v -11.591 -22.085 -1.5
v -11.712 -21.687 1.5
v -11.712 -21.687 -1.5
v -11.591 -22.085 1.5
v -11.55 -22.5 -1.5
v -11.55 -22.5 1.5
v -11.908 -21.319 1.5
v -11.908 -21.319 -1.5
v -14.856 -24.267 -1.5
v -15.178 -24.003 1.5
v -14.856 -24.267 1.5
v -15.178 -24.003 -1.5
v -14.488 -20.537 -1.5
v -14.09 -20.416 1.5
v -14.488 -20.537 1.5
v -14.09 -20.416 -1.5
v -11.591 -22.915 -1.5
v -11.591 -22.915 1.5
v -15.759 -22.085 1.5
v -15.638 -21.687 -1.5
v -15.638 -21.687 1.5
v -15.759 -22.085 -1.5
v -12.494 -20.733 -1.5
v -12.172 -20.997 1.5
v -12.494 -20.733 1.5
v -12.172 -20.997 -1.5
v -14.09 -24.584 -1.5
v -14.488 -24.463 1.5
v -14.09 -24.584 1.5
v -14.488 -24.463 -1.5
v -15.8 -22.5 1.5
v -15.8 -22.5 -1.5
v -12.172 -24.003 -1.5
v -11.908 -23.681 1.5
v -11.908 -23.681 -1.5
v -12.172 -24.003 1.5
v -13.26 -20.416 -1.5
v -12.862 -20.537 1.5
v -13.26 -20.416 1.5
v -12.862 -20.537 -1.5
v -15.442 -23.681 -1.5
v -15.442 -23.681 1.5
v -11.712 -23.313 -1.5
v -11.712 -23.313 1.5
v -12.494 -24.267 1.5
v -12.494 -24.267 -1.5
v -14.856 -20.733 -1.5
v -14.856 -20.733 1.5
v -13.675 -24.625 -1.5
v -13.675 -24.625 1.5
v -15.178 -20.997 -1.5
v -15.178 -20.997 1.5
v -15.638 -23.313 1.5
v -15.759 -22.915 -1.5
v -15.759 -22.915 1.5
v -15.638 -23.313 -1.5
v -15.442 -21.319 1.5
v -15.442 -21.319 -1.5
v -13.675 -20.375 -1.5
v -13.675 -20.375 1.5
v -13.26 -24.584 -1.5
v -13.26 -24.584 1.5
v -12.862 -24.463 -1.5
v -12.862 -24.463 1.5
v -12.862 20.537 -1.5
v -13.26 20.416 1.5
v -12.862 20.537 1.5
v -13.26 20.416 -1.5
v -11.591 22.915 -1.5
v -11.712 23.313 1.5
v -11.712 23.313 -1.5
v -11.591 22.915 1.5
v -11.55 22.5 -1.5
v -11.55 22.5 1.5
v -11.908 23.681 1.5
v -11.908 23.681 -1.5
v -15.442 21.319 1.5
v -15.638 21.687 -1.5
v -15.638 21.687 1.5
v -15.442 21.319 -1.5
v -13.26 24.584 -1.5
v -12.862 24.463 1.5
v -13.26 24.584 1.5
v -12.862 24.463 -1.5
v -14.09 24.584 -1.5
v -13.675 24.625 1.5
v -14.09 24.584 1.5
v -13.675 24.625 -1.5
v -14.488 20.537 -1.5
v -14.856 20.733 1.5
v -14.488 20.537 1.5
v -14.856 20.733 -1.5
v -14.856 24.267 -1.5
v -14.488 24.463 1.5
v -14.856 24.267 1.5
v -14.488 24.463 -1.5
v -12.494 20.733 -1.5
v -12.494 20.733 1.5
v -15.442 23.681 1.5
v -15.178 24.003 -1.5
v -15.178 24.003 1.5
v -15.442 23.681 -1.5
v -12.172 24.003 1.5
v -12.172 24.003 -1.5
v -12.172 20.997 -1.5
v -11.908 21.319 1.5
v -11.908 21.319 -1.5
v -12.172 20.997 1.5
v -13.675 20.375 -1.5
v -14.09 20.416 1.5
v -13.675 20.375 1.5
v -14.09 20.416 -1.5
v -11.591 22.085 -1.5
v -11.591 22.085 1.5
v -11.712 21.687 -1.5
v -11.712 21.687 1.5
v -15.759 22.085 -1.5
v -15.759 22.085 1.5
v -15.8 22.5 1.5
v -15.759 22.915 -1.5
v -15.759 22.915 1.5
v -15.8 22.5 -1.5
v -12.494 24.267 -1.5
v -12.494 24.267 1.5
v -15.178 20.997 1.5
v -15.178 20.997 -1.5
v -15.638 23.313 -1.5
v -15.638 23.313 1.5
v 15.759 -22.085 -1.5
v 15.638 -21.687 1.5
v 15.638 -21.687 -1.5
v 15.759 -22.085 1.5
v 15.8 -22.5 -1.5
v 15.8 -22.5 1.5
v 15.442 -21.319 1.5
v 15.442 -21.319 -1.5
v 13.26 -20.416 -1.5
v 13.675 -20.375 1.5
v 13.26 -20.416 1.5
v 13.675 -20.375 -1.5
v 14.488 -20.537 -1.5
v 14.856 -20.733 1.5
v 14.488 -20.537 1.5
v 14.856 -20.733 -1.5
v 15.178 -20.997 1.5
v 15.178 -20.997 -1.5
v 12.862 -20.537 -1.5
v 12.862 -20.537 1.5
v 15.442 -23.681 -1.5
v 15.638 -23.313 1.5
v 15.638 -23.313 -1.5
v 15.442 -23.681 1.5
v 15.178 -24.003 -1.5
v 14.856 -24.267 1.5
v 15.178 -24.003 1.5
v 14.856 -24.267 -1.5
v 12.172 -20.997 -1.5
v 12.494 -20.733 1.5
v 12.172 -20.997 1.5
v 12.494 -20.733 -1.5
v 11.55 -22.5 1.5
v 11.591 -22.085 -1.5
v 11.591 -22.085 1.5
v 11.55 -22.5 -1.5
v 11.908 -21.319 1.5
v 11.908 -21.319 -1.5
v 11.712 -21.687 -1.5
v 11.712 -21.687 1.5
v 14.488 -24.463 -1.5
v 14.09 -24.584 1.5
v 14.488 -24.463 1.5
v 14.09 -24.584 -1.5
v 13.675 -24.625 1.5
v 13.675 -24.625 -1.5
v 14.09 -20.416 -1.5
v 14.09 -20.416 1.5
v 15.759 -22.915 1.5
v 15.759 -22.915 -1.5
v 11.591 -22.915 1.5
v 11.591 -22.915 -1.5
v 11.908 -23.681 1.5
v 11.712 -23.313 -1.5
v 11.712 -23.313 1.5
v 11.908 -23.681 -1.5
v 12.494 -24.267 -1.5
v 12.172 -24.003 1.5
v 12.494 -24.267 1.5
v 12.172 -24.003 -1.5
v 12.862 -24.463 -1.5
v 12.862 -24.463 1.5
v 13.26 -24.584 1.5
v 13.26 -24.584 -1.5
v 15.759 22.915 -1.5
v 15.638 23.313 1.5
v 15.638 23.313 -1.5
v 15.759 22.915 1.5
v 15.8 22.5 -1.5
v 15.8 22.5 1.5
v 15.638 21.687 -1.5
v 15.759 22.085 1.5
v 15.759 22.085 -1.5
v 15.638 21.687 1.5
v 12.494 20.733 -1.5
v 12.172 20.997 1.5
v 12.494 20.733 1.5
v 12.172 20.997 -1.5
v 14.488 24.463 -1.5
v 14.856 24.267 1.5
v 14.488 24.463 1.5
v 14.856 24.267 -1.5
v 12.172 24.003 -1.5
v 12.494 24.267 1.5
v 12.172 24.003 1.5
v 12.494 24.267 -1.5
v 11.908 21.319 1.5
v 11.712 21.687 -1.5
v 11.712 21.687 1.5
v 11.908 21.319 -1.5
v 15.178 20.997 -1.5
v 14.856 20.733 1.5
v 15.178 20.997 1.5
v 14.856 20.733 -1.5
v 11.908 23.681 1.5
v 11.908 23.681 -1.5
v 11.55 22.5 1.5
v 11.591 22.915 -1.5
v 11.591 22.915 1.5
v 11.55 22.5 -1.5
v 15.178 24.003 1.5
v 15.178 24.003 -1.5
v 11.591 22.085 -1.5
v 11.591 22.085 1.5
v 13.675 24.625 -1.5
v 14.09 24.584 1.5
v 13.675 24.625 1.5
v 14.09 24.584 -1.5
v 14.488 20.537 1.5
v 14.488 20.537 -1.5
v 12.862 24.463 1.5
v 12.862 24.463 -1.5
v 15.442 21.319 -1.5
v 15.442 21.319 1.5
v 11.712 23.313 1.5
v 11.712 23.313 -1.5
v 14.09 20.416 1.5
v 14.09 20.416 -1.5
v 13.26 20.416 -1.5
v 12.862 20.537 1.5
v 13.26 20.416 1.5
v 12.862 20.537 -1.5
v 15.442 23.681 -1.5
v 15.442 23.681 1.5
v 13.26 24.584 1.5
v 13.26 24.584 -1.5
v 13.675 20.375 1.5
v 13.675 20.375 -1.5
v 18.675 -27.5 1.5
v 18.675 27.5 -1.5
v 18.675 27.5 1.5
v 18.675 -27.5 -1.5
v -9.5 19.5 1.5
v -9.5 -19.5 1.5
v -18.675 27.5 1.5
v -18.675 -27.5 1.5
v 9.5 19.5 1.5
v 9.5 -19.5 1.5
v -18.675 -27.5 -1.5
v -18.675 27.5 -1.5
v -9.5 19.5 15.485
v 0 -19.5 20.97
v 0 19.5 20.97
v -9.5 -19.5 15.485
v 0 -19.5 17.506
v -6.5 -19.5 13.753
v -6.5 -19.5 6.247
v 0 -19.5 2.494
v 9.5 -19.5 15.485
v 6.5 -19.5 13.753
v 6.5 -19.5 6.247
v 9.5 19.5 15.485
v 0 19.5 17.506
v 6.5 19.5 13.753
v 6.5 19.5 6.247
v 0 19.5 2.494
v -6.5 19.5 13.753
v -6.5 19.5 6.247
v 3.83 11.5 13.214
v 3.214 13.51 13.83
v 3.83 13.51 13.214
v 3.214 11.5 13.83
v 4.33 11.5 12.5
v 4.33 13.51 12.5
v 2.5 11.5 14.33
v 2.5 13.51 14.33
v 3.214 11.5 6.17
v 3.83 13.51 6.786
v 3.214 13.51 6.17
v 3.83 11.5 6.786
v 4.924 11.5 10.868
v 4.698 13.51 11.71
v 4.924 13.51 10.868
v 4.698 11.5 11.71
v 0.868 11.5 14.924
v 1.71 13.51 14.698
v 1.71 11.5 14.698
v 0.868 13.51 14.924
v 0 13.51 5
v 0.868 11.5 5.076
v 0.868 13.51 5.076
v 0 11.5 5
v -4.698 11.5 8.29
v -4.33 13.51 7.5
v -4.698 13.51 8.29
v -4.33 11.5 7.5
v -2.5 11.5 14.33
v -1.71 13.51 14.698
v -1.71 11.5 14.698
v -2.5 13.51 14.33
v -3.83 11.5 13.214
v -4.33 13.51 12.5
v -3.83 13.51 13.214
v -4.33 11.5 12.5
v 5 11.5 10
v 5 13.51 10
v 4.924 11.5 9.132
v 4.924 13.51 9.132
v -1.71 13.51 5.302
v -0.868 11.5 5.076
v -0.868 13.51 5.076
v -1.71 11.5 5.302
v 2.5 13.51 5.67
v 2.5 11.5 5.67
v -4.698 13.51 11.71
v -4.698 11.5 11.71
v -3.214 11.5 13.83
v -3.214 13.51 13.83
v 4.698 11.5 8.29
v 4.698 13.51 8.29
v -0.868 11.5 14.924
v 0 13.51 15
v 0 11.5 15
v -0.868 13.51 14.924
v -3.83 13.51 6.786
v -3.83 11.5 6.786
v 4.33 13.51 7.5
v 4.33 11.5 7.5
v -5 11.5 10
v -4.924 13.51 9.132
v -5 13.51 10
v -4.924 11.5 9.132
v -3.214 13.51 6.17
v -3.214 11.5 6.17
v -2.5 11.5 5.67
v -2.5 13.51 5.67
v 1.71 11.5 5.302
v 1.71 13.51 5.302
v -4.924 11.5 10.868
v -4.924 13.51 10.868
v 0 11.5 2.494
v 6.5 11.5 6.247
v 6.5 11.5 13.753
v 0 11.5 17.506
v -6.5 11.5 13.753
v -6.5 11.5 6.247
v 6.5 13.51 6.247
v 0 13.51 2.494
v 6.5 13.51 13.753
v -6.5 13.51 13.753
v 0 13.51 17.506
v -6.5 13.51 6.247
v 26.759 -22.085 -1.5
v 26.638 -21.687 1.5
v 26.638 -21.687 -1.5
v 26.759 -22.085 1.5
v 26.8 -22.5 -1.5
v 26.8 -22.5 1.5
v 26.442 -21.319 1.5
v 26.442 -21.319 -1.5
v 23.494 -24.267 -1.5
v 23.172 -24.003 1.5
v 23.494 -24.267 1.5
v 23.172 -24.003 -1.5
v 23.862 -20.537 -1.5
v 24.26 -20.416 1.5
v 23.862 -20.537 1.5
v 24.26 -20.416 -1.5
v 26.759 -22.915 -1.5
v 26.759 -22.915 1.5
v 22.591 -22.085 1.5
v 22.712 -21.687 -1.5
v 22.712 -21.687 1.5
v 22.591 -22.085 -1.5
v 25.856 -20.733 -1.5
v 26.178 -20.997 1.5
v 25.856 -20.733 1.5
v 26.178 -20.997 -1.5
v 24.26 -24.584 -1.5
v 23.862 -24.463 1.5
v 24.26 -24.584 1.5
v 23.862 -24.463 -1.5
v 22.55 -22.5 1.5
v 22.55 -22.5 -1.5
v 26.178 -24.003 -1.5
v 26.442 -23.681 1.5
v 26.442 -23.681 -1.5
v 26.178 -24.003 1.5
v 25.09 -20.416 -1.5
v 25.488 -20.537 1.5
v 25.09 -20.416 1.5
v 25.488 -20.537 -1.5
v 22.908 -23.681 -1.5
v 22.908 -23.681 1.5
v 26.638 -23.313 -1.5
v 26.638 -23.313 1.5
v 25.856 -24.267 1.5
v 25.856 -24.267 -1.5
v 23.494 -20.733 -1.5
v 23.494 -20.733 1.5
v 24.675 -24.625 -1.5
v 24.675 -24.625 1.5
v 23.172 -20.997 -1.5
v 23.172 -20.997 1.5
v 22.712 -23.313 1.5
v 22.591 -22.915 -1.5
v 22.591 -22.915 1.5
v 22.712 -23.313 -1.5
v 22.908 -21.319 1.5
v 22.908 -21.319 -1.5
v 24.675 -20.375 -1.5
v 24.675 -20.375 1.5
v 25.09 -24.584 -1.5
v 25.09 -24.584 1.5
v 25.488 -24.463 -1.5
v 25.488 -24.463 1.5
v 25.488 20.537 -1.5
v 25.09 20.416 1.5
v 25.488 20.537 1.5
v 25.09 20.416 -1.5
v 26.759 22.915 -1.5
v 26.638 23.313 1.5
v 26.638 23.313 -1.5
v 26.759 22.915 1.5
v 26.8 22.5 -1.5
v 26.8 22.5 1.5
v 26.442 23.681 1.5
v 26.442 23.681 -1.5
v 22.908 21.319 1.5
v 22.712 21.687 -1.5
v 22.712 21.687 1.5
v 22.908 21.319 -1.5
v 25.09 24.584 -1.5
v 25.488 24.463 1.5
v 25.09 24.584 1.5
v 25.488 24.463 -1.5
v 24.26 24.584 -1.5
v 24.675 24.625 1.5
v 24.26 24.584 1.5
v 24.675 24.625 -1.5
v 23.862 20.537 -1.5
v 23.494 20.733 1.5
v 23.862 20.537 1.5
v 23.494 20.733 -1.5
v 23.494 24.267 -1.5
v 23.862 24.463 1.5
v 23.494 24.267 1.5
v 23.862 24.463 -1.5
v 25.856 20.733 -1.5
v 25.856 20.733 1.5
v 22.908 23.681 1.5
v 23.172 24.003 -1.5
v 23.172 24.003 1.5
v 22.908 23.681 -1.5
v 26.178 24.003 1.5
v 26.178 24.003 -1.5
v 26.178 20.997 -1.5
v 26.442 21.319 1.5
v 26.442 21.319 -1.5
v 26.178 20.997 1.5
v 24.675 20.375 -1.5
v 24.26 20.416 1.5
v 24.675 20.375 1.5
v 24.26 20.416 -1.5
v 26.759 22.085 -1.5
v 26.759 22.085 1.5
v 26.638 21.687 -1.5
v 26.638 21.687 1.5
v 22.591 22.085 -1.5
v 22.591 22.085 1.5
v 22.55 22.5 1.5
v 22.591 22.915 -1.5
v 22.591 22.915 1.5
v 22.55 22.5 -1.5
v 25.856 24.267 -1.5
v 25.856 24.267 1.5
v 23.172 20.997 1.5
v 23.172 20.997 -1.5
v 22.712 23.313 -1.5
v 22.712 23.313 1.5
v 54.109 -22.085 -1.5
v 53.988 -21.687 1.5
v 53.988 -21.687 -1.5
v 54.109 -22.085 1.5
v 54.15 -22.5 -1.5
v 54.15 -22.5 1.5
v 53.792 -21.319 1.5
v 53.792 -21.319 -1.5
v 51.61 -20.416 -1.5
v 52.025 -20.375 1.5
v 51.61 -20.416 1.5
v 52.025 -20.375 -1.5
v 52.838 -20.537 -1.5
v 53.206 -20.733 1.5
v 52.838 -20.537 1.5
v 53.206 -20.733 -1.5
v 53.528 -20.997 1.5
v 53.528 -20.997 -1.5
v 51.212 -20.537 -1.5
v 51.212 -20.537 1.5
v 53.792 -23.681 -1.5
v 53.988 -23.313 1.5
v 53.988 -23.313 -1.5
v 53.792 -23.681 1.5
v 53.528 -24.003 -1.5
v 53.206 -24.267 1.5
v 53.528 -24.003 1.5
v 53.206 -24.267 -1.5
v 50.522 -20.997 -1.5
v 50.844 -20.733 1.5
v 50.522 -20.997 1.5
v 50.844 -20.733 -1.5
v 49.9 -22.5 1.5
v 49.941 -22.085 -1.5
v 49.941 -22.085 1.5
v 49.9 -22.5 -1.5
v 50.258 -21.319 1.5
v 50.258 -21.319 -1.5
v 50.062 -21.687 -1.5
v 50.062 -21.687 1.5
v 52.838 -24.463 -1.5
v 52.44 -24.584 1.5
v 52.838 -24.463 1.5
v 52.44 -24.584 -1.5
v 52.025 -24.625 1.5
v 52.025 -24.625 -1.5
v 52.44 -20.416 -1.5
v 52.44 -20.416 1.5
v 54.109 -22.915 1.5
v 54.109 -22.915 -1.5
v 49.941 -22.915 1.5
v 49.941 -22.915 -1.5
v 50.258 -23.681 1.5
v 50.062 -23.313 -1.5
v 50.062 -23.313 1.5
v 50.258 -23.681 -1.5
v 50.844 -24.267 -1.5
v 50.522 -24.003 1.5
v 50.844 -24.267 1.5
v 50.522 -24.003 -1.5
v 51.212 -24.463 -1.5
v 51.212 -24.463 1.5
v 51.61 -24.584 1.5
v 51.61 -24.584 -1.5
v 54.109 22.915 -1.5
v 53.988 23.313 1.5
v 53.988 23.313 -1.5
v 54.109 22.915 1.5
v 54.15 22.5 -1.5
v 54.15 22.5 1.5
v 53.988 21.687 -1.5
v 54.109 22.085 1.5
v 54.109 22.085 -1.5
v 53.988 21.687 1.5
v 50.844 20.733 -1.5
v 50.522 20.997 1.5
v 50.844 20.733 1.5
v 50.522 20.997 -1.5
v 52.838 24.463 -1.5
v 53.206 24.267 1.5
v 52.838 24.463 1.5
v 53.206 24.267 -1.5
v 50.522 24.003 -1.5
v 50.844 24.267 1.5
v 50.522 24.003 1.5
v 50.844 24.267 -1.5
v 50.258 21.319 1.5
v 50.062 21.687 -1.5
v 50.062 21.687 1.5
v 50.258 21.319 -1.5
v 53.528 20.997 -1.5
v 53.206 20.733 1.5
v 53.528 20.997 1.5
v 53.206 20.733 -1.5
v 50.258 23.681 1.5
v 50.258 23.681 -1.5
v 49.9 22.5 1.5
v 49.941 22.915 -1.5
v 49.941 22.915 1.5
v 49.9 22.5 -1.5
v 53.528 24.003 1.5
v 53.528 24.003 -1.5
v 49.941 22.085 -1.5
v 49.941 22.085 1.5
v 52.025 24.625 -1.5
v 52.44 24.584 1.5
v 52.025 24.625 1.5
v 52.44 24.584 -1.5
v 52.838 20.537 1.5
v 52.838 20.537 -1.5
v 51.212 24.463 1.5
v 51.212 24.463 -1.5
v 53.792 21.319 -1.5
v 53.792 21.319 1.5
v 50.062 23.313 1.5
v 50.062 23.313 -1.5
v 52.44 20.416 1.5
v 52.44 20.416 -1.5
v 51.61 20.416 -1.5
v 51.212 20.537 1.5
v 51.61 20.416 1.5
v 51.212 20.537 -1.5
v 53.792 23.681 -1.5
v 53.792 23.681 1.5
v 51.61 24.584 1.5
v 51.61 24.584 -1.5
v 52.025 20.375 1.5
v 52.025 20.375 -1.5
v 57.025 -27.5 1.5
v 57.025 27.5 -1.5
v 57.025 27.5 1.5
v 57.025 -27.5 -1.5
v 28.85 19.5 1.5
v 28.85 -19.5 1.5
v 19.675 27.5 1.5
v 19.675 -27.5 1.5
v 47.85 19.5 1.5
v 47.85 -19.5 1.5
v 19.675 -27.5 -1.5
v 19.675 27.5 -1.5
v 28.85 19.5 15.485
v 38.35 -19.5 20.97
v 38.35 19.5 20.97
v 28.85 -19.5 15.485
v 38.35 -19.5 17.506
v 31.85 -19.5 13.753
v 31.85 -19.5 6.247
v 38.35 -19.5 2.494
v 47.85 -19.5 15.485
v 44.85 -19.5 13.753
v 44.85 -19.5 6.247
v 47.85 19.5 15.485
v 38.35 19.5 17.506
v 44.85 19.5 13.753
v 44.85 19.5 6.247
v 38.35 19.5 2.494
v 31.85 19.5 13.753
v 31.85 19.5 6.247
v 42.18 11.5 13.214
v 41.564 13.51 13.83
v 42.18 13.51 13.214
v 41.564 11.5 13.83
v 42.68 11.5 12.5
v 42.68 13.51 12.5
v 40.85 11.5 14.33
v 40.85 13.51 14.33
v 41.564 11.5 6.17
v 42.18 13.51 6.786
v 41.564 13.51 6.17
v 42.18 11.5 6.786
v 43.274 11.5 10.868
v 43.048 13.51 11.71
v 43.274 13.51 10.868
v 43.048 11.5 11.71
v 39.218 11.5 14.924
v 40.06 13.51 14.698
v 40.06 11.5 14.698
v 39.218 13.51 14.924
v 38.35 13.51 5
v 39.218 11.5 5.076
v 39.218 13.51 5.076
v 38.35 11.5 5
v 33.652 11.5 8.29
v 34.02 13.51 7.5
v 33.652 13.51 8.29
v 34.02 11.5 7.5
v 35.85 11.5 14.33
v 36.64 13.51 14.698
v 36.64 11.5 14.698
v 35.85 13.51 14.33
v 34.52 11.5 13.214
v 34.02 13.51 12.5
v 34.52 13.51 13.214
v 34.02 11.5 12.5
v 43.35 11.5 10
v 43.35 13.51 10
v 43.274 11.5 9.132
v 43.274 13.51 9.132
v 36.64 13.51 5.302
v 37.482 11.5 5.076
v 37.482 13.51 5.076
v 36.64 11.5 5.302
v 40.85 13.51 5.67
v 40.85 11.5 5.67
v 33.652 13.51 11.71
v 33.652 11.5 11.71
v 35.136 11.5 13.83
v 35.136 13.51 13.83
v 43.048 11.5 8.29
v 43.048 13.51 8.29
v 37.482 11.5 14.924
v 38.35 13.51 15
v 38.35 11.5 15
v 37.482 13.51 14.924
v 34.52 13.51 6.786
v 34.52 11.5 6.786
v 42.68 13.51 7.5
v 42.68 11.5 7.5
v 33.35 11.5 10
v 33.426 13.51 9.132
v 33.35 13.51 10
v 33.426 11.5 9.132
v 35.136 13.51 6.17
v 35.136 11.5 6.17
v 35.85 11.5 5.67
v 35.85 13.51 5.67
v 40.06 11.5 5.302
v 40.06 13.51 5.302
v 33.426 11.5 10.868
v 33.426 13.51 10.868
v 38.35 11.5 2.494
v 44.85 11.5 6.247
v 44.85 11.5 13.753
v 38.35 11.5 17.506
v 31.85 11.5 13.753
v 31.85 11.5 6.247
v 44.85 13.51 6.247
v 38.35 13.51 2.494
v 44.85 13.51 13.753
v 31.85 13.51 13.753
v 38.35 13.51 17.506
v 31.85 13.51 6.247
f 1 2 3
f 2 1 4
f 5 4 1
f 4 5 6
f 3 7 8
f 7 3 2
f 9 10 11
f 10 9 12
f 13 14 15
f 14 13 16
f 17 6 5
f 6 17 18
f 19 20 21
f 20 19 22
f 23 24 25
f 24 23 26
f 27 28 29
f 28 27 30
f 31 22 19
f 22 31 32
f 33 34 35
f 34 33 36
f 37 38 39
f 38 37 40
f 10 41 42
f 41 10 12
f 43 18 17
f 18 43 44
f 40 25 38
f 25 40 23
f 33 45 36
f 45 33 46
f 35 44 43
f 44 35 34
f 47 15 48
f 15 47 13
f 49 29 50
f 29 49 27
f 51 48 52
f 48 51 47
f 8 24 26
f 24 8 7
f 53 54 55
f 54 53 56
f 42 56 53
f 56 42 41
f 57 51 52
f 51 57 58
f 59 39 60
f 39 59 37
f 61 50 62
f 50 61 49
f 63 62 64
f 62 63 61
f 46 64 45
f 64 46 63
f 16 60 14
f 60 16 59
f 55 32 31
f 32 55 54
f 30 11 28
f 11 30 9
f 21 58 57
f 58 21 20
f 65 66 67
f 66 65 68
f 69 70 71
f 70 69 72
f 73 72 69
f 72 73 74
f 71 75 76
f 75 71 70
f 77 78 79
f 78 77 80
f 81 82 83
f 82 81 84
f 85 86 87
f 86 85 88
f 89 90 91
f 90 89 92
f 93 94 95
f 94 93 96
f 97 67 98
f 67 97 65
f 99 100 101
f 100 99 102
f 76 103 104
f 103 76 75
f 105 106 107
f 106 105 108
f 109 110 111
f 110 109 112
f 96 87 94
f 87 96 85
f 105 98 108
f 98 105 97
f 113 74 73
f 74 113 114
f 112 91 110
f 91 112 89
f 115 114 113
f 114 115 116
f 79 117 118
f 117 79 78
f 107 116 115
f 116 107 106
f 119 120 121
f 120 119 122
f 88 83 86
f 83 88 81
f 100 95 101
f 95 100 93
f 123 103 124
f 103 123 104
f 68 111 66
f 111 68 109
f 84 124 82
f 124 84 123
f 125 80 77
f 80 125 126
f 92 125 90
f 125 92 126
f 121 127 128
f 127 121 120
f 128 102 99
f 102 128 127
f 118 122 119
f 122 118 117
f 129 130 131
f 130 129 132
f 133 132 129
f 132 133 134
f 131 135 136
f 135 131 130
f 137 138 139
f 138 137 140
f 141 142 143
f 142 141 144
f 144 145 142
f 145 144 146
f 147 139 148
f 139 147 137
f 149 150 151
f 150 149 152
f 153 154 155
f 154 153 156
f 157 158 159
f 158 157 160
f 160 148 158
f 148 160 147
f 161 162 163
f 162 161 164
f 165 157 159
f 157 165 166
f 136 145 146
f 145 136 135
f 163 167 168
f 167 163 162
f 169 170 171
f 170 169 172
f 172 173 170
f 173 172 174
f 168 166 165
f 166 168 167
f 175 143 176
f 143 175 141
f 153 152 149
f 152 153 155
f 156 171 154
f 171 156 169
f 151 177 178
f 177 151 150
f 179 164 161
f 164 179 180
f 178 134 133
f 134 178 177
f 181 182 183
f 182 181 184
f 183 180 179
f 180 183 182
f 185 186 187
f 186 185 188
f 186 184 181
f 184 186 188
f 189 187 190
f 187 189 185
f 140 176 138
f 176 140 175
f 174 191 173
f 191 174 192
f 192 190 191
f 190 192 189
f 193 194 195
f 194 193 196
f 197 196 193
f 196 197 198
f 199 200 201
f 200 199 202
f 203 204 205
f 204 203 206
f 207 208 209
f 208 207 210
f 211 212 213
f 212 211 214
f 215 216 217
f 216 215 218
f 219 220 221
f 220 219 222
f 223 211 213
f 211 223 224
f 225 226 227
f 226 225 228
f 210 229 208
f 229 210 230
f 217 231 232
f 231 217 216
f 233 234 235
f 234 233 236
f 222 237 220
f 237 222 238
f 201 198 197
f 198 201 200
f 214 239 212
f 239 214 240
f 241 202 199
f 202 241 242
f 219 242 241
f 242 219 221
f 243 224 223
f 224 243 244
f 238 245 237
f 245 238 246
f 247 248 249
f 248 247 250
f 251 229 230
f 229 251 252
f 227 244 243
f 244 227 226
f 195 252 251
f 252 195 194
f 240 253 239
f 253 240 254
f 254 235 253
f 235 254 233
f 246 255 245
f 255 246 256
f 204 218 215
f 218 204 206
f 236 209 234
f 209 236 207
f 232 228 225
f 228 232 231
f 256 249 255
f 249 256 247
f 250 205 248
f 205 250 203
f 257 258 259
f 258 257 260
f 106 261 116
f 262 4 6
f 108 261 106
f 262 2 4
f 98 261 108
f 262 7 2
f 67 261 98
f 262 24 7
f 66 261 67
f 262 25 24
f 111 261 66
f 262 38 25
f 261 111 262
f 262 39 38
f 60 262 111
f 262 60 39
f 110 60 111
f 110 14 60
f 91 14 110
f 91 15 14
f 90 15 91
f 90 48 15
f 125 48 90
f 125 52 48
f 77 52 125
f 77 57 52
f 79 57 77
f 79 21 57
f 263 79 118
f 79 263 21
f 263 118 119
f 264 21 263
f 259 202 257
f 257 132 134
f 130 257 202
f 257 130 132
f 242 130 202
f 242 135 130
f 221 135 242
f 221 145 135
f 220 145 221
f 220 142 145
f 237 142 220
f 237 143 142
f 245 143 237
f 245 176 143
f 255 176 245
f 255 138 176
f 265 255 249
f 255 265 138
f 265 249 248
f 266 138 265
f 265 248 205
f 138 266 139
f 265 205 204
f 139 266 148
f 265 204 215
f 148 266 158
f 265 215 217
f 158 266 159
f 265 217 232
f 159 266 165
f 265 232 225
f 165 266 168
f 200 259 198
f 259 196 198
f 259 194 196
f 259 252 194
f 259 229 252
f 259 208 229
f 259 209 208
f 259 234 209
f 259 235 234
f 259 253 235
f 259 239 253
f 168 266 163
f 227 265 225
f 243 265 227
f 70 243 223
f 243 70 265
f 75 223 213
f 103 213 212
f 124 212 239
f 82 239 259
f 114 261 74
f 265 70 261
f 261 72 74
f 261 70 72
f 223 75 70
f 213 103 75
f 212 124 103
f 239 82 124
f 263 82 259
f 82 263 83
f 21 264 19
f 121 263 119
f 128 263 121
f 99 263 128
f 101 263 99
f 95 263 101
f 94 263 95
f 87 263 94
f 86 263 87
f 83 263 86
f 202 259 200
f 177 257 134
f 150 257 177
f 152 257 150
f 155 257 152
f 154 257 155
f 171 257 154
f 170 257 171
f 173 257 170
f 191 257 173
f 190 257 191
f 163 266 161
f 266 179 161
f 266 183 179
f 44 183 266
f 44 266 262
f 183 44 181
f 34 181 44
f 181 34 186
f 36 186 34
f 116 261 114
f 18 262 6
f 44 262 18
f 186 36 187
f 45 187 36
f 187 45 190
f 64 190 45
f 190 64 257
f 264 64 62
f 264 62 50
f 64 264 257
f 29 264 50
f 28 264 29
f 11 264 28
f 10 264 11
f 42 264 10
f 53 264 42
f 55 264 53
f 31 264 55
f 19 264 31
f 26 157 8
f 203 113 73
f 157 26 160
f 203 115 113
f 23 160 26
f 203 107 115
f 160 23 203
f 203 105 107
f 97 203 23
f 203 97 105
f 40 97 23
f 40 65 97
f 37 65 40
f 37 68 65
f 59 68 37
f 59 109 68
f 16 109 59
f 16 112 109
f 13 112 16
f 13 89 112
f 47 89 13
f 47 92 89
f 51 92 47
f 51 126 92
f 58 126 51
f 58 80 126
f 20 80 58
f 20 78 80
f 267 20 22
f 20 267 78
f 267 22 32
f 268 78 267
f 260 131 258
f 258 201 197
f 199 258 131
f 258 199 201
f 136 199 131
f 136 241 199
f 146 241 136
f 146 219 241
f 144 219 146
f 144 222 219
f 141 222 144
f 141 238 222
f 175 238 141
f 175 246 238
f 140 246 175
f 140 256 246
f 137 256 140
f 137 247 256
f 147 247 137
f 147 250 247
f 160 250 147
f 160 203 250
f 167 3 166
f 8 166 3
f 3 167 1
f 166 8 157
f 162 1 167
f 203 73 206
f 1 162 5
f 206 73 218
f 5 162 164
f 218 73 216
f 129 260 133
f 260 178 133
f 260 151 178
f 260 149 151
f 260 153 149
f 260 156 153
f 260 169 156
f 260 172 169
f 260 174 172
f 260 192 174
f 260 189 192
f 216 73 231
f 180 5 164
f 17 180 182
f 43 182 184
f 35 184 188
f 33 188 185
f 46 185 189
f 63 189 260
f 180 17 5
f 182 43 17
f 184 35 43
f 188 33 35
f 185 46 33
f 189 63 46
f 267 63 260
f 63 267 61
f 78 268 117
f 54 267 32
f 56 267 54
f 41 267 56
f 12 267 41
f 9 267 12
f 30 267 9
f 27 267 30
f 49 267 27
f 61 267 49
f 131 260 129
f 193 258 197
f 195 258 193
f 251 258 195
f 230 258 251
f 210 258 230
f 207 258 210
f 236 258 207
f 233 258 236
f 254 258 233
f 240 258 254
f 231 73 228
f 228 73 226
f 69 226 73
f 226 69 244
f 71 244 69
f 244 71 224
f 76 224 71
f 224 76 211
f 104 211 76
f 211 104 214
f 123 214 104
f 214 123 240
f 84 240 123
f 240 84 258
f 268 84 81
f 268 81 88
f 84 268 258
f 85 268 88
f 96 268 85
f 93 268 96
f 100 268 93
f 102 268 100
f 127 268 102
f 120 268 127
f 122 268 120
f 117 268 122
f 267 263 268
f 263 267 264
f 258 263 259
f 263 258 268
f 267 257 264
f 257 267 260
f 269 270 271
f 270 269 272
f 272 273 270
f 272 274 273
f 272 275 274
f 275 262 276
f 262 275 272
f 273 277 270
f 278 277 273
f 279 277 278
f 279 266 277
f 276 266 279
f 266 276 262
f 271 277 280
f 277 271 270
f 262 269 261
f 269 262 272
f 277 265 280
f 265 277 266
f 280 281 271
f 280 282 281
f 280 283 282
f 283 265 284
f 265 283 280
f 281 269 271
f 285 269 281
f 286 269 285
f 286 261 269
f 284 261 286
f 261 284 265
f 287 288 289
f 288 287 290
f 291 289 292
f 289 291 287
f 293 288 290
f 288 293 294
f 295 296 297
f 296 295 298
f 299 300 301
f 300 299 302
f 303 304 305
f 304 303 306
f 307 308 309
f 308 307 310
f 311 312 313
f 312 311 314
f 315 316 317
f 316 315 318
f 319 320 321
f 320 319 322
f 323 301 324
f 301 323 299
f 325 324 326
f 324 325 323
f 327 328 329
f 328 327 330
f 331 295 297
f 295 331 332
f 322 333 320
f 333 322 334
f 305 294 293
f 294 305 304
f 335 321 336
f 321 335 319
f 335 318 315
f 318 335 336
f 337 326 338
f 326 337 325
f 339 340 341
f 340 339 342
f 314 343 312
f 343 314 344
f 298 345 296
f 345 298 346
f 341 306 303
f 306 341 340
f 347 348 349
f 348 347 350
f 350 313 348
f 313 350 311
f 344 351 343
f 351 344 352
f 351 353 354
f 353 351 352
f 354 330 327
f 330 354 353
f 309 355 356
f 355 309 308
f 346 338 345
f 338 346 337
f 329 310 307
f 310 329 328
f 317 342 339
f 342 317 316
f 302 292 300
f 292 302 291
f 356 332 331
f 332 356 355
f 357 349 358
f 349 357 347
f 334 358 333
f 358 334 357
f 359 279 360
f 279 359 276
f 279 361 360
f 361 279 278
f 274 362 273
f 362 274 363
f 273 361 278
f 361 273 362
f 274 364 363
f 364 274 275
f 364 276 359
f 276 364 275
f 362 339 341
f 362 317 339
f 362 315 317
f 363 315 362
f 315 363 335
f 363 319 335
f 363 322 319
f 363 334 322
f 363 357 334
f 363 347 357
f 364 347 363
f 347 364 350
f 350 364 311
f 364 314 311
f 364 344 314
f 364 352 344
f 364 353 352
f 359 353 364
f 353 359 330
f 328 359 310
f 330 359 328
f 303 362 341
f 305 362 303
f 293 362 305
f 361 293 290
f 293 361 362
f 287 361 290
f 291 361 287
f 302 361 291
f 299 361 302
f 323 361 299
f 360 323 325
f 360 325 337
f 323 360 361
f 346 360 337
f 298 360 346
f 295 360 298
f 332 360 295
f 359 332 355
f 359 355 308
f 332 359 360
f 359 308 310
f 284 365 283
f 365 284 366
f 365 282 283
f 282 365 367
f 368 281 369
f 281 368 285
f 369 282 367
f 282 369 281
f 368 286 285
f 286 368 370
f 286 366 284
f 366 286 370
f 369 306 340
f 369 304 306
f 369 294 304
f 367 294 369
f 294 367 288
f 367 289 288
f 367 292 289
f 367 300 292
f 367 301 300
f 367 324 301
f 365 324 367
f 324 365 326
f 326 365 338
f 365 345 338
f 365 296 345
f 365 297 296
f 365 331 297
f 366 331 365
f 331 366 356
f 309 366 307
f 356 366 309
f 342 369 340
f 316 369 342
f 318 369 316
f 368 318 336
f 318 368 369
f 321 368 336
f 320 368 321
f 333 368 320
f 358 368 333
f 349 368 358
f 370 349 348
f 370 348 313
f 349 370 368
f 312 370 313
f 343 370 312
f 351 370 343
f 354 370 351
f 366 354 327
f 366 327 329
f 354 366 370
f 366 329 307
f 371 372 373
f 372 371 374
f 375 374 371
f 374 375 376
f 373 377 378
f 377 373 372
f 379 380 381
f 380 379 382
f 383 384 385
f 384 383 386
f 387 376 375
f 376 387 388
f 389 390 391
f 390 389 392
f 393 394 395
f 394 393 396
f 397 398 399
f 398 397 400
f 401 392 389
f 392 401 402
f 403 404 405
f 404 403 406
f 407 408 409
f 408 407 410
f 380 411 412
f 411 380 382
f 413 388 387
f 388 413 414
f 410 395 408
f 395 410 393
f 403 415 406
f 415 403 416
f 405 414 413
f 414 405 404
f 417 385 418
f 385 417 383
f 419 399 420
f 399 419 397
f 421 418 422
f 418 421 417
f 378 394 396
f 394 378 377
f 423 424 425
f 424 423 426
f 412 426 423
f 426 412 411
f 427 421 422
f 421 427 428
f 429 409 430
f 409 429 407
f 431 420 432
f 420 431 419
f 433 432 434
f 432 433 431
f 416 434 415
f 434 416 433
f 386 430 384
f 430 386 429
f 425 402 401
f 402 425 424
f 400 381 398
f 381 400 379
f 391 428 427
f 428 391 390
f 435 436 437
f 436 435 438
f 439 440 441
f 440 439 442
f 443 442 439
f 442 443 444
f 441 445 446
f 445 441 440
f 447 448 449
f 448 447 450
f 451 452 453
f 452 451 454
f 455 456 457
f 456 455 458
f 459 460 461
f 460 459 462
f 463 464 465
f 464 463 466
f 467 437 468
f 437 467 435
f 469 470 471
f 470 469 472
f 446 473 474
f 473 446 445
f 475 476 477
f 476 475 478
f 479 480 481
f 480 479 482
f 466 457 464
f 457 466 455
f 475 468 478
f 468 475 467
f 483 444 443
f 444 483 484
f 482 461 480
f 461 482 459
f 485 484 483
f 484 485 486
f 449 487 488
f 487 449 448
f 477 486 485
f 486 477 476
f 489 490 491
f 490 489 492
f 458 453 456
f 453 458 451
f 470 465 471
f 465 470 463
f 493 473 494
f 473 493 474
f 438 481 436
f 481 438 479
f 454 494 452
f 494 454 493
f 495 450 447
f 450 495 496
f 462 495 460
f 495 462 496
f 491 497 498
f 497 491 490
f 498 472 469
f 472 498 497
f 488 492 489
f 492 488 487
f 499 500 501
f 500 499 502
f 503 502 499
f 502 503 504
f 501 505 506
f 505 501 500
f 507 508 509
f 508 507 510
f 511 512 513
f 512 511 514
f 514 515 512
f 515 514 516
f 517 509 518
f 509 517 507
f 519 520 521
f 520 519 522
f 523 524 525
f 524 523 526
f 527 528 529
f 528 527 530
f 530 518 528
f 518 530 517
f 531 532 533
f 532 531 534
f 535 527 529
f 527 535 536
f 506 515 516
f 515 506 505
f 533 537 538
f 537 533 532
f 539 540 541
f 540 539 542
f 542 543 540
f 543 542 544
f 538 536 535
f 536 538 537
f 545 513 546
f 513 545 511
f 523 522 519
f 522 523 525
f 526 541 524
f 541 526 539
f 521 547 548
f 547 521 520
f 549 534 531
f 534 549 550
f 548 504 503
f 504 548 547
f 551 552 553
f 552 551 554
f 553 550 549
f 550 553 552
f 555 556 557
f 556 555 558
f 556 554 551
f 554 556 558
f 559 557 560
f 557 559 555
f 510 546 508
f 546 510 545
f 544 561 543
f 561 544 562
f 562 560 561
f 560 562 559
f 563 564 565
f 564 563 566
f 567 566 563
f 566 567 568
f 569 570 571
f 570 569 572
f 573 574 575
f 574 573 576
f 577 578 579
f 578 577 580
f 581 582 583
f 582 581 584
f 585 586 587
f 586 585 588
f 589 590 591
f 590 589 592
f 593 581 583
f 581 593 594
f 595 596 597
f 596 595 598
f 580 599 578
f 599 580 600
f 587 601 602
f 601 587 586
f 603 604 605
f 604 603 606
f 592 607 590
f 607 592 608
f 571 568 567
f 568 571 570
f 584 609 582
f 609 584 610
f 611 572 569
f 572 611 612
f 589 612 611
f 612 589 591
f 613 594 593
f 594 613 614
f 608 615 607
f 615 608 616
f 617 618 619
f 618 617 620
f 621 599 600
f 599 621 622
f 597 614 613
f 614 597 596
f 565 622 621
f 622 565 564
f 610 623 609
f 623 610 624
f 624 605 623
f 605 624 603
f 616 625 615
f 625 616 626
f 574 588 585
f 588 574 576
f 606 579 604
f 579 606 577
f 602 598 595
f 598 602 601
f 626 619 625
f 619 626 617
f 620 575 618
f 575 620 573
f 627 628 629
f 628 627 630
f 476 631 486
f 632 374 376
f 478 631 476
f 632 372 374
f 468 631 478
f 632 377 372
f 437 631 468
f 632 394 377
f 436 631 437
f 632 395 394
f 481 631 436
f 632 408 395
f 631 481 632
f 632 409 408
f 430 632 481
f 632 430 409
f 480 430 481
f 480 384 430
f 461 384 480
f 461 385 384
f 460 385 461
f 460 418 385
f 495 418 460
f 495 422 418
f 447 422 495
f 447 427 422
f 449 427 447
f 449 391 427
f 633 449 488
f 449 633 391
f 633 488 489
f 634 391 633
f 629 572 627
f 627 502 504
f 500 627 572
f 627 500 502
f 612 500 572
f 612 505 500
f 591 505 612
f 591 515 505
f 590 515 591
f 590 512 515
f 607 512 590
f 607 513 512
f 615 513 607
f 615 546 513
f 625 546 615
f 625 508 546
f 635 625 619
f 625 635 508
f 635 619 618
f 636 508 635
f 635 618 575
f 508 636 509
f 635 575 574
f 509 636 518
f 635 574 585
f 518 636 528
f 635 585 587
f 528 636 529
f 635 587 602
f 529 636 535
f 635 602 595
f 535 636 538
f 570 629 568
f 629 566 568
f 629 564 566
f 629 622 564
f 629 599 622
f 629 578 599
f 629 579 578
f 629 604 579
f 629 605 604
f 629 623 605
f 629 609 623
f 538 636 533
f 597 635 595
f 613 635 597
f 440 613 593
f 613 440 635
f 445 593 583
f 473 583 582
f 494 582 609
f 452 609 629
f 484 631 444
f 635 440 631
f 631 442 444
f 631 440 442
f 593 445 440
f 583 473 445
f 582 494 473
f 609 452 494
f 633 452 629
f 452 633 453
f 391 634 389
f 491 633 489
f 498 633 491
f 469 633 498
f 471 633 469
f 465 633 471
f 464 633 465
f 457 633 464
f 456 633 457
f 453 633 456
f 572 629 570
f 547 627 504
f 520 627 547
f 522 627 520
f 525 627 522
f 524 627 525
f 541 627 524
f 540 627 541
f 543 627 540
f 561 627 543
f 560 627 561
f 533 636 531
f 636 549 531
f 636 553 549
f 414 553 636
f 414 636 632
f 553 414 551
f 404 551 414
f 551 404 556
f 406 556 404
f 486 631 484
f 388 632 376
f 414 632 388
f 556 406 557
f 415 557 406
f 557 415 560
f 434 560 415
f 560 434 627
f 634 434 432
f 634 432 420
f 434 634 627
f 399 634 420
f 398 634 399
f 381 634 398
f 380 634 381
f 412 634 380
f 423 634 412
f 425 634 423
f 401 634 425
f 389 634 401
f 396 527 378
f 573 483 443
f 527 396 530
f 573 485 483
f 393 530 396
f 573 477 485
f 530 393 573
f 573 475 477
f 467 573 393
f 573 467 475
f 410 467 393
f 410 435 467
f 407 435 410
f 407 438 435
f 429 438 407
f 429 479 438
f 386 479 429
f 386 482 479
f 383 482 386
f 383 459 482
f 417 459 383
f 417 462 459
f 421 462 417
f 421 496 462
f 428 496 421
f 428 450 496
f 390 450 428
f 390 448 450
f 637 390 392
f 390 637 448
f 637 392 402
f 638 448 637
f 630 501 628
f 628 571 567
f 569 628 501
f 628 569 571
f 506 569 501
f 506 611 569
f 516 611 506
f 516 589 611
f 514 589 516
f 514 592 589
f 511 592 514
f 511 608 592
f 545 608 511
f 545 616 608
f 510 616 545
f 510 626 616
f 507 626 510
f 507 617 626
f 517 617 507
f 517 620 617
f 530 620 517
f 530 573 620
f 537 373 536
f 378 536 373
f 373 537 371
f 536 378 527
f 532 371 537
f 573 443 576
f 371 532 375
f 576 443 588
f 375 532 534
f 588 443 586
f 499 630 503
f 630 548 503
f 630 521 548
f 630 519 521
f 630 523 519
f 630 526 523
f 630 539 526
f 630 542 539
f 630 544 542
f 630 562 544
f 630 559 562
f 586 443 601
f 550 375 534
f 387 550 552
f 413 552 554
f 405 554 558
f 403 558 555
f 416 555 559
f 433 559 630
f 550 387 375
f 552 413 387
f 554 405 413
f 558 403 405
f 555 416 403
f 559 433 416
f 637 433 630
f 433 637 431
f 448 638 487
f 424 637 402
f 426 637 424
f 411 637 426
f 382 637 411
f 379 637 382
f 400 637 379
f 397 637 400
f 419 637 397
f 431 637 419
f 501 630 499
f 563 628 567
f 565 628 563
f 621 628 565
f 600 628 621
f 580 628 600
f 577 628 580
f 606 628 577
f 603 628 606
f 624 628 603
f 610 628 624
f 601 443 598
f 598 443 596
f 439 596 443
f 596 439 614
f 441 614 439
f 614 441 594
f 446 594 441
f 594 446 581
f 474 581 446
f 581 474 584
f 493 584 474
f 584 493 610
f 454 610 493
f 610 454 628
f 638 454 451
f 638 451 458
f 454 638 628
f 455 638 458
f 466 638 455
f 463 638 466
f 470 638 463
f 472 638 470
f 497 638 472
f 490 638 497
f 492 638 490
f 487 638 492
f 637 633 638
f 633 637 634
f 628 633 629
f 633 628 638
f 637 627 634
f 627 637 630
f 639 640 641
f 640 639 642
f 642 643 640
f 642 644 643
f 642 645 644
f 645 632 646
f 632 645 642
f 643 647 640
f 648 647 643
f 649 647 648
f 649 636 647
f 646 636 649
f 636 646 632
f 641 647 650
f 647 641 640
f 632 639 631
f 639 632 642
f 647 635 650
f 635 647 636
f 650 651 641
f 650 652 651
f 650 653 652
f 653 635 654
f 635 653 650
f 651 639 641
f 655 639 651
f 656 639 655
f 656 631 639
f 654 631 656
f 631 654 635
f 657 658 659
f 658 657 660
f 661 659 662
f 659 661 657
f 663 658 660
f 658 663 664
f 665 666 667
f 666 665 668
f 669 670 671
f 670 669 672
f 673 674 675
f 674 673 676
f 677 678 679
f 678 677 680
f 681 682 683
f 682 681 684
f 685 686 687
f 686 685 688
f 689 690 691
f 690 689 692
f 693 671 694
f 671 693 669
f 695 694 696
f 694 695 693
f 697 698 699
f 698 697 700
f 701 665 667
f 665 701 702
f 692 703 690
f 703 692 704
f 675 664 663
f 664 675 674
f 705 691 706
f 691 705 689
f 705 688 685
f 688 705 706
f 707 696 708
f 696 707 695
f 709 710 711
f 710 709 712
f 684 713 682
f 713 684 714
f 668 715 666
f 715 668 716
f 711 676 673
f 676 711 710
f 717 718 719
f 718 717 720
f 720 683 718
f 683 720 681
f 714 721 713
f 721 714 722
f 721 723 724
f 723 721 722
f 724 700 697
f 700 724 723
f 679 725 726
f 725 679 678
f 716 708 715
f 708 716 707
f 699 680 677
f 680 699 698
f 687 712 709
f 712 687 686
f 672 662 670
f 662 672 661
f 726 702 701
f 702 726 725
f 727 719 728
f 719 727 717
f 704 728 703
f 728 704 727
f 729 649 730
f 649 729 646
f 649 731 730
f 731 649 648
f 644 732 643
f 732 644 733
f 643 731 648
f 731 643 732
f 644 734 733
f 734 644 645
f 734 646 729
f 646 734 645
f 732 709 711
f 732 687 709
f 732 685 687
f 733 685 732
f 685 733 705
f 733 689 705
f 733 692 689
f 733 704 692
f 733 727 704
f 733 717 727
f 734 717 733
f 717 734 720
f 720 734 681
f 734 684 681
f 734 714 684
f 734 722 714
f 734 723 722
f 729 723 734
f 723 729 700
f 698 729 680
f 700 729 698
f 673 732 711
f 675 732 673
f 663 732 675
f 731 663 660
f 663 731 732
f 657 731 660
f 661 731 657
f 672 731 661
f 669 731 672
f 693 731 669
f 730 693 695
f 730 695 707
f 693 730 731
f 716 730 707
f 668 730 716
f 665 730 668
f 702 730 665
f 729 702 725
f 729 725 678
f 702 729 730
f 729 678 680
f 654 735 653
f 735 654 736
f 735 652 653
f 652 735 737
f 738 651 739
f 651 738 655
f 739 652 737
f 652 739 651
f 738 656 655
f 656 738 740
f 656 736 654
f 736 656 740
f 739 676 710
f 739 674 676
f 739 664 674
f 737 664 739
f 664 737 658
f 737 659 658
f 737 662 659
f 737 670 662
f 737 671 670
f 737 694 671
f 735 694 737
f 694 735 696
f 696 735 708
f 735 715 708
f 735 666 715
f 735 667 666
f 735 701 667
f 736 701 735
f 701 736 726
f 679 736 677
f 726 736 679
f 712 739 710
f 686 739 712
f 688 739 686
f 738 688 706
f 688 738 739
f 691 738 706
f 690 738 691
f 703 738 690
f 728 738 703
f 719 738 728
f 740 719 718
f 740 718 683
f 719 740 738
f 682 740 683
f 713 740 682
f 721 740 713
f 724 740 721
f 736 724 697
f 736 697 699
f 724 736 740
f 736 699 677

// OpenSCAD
// file: includes/config.scad
$fn=32;

nema_size_x = 42.3;
nema_size_y = 42.3;
nema_screw = 4;
nema_screw_cap = 8;
nema_hole_spacing = 31;
nema_center_hole = 22;

x = 27.35; //bolt hole spacing
y = 45;

X_rod_diameter = 10;
Y_rod_diameter = 8;
Z_rod_diameter = 10; //smooth rod

Z_bearing_dia = 15;
Z_bearing_h = 25;

block_bolt_size = 4;
block_bolt_head = 9;
z_nut = 13;
z_rod = 8; //threaded rod
z_motor_bolt = 5.5;
d_spacer=12;
d_bolt=5;
clearance = 0.25;
// file: includes/adjustments.scad
//these two are needed otherwise you need to put them in
//if you forget it'll complain about unknown variables.
$fn=32;
center=false;

module nut()
{
cylinder(d=(2*(tan(30)*nut_size)),h=nut_h, center=center, $fn=6); // don't do anything here
    //echo ("point to point:"); // this just echoes
    //echo ((tan(30)*nut_size)*2); //the diameter of a circle that will encompass the exterior of the hexagonal shape.
}

module hole()
{ 

    //hole = size of the hole
    //h = height
    cylinder(d=(hole_dia+(hole_dia-(cos(360 / (2*$fn)) * hole_dia) )),h=h,center=center,$fn=$fn); 
    //echo ("real hole diameter");
    //echo ((hole_dia+(hole_dia-(cos(360 / (2*$fn)) * hole_dia) )));
}
// file: includes/X-rod spacing.scad
include <config.scad>
include <adjustments.scad>

module x_rod_spacing() {
    translate([0,0,0])cube([x+10,y+10,4],center=true);
}

module block_bolt_cutouts(){
    translate([-x/2,-y/2,0])cylinder(d=block_bolt_size+clearance, h=5,center = true);
    translate([-x/2,y/2,0])cylinder(d=block_bolt_size+clearance, h=5,center = true);
    translate([x/2,-y/2,0])cylinder(d=block_bolt_size+clearance, h=5,center = true);
    translate([x/2,y/2,0])cylinder(d=block_bolt_size+clearance, h=5,center = true);
    
    translate([-x/2,-y/2,30/2+2.1])cylinder(d=block_bolt_head+clearance, h=30,center = true);
    translate([-x/2,y/2,30/2+2.1])cylinder(d=block_bolt_head+clearance, h=30,center = true);
    translate([x/2,-y/2,30/2+2.1])cylinder(d=block_bolt_head+clearance, h=30,center = true);
    translate([x/2,y/2,30/2+2.1])cylinder(d=block_bolt_head+clearance, h=30,center = true);
    
    translate([0,-y/2,23])cube([x+11,1,20],center=true);
    translate([0,y/2,23])cube([x+11,1,20],center=true);
    
    translate([0,0,23])rotate([90,0,0])nut(nut_size=8,nut_h=y-10,center=true);
    translate([0,0,23])rotate([90,0,0])cylinder(d=5+clearance,h=y+25,center=true);
}

module smooth_rod_block(){
    translate([0,-y/2,30/2-2])cube([x+10,20,30],center=true);
    translate([0,y/2,30/2-2])cube([x+10,20,30],center=true);
 }
 
 module smooth_rods(){
    translate([0,-y/2,15])rotate([0,90,0])cylinder(d=10.3,h=450,center=true,$fn=64);
    translate([0,y/2,15])rotate([0,90,0])cylinder(d=10.3,h=450,center=true,$fn=64);
 }
 
// main file
/*
todo: clean this crap up, includes are including includes.

*/
include <includes/X-rod spacing.scad> //this one in particular is a mess.
include <includes/adjustments.scad>
include <includes/config.scad>

//y and z_nut are found in config.scad
housing = z_nut+6;
housing_length = y-6;

//probably wrong, I'm no good with math
//point1 = sin(30)*(tan(30)*(housing));
point2 = (tan(30)*(housing));
point1 = sin(30)*point2;
//echo (point1);
//echo (point2);

module nutygon(){ //this bit makes the outer housing for the nut that connects to the flat plate.
    linear_extrude((housing_length)/2)
    polygon(
        points = [[(housing)/2,0],[(housing)/2,point1],[0,point2],[-(housing)/2,point1],[-(housing)/2,-point2],[(housing)/2,-point2]]);
}

module z_follower(){
    union(){
        difference(){
            translate([0,0,0])cube([x+10,y+10,3],center=true); //the flat plate
            block_bolt_cutouts(); //this is a mess. creates the holes for the 4 bolts.
        }
        translate([0,0,10])
            rotate([90,0,0])
                difference(){
                    union(){
                        nutygon();
                        mirror([0,0,1])nutygon();
                    }
                    rotate([0,0,30])cylinder(d=z_rod+2,h=housing_length+1,center=true,$fn=36); //hole for the threadded rod to go through
                    translate([0,0,-(housing_length/2)+8])rotate([0,0,30])nut(nut_size=z_nut,nut_h=housing_length); //top bit where the spring loaded nut goes
                    translate([0,0,-(housing_length/2)-0.01])rotate([0,0,30])nut(nut_size=z_nut,nut_h=6); //bottom nut goes in here
                }
    }
}

z_follower();
translate([x+11,0])z_follower();
